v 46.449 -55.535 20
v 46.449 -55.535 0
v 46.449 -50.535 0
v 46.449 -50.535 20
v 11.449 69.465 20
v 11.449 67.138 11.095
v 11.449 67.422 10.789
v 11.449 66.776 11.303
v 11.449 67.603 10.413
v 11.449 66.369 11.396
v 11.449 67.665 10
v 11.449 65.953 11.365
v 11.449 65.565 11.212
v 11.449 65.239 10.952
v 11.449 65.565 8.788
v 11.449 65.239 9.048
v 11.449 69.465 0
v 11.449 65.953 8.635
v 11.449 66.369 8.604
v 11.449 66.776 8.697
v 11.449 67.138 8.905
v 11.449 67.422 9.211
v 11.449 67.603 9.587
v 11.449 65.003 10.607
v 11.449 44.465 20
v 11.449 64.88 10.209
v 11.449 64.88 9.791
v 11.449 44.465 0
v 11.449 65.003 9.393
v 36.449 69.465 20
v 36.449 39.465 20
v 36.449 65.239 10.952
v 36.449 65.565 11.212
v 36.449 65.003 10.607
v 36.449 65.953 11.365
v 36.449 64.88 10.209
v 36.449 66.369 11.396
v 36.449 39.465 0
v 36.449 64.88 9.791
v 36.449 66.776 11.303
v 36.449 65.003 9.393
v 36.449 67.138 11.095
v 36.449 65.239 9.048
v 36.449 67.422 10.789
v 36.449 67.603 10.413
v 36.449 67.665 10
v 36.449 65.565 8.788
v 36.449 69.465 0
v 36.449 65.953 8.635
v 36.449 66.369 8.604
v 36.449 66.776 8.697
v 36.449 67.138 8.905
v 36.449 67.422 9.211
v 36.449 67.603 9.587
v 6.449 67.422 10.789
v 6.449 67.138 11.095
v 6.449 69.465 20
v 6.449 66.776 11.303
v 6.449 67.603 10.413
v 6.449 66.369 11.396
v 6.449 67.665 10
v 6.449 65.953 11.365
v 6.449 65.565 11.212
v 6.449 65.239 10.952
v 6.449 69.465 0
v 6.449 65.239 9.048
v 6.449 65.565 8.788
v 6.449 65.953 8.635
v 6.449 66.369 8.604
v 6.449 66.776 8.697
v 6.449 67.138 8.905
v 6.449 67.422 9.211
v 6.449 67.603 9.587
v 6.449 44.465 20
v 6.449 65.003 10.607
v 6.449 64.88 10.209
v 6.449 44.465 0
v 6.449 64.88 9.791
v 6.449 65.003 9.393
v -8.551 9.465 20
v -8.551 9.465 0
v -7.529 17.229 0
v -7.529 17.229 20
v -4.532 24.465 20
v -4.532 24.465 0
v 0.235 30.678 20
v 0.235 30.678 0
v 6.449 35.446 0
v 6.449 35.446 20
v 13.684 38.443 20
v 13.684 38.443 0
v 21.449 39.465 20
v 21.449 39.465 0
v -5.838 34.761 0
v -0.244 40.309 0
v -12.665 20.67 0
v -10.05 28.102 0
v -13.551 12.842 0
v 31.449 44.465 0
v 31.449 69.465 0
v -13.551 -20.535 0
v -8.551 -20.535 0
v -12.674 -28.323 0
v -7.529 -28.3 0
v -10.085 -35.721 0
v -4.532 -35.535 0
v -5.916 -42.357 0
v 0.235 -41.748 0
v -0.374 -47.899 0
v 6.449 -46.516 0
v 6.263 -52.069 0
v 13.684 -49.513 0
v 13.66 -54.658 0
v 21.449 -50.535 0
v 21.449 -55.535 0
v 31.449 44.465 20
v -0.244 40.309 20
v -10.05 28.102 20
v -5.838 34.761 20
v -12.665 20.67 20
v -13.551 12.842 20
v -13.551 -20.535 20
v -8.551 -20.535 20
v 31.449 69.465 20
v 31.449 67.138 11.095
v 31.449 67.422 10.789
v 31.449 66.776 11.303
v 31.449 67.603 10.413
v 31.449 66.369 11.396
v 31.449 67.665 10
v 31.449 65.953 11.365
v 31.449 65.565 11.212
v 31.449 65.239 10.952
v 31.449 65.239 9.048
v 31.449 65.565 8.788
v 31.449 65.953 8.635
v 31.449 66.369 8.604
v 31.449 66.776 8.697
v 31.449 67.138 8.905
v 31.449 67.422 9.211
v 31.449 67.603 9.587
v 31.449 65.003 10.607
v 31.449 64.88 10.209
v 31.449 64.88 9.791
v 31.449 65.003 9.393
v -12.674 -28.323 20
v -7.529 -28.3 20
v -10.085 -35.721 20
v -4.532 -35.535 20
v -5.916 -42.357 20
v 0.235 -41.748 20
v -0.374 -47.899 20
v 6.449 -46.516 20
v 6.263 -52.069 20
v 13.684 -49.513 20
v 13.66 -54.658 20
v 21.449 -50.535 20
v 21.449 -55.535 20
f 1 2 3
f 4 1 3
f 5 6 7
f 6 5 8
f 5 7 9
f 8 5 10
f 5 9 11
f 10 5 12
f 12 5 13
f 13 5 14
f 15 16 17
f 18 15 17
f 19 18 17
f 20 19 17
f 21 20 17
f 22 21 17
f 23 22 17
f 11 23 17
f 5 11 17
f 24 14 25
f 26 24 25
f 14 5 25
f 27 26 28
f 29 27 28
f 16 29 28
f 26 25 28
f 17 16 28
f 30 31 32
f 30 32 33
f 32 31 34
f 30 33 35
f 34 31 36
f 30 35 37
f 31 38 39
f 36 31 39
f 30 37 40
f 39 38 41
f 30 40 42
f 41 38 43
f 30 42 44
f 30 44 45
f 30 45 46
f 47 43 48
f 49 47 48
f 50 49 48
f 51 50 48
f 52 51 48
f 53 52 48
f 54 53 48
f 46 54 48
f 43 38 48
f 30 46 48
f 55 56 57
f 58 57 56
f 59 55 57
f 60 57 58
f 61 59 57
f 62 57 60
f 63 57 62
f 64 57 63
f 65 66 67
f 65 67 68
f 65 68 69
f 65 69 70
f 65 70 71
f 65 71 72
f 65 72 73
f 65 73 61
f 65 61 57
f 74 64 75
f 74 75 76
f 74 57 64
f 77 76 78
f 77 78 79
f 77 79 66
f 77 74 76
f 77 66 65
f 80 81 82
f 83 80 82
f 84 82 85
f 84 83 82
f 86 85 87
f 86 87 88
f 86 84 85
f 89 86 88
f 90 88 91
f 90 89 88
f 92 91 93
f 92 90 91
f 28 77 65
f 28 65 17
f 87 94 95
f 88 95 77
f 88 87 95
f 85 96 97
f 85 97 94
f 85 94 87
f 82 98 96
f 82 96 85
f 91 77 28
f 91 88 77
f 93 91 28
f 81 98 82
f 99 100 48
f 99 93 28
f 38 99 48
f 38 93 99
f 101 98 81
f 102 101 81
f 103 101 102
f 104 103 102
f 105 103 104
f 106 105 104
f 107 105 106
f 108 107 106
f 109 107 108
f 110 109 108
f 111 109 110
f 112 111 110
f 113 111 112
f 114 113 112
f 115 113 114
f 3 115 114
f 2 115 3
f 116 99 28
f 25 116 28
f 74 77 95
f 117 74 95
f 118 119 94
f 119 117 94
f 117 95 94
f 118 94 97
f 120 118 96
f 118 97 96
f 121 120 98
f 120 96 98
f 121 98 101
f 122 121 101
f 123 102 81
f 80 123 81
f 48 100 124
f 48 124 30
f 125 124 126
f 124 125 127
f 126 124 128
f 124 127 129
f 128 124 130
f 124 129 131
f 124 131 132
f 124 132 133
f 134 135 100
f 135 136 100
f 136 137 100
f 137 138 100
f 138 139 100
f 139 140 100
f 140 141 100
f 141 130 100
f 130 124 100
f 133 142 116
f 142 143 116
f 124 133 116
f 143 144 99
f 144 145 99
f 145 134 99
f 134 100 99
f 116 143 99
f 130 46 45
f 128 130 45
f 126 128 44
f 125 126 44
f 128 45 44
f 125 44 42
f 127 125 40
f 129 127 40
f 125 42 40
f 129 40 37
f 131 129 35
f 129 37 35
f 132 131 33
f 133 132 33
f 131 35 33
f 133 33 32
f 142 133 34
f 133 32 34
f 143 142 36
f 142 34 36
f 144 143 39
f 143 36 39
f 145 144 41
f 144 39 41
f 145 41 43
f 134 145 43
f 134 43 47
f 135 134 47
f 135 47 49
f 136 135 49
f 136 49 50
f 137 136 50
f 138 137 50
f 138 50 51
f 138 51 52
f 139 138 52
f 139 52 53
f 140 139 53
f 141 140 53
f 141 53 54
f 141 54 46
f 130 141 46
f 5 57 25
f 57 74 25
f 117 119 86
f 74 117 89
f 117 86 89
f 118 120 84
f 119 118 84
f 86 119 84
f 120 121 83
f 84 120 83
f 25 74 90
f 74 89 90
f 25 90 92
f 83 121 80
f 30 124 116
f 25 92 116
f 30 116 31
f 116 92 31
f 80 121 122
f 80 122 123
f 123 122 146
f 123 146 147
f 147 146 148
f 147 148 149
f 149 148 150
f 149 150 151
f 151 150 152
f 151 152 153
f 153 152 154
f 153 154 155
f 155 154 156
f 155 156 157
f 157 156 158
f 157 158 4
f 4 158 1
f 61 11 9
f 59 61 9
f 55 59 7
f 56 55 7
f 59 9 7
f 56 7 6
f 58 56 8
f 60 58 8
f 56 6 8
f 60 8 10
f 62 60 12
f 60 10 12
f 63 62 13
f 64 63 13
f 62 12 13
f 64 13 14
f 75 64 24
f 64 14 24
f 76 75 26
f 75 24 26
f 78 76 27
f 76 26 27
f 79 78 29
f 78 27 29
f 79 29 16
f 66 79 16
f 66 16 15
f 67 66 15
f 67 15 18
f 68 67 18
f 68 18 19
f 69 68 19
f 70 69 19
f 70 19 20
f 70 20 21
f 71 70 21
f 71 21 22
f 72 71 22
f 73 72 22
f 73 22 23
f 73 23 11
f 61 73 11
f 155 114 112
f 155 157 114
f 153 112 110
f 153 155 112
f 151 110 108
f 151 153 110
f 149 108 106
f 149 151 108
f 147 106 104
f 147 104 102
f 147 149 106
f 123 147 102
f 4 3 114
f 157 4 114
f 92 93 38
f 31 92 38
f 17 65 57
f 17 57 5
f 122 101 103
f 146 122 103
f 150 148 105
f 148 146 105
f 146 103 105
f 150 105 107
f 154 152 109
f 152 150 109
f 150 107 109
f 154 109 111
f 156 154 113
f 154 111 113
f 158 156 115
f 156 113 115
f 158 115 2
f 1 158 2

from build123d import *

# Parameters (mm, degrees)
BOSS_EXTRUDE1_DEPTH = 20
FILLET1_R           = 30
FILLET2_R           = 35
SKETCH2_W           = 5
SKETCH2_H           = 20
BOSS_EXTRUDE2_DEPTH = 15
SKETCH3_R           = 1.4
CUT_EXTRUDE1_DEPTH  = 45


with BuildPart() as part:
    # Sketch1 → Boss-Extrude1 (new body)
    with BuildSketch(Plane.XY):
        Polygon((11.448507825, 54.464802922), (6.448507825, 54.464802922), (6.448507825, 44.464802922), (-8.551492175, 44.464802922), (-13.551492175, 44.464802922), (-13.551492175, 39.464802922), (-13.551492175, -50.535197078), (-13.551492175, -55.535197078), (-8.551492175, -55.535197078), (46.448507825, -55.535197078), (46.448507825, -50.535197078), (-8.551492175, -50.535197078), (-8.551492175, 39.464802922), (6.448507825, 39.464802922), (36.448507825, 39.464802922), (36.448507825, 54.464802922), (31.448507825, 54.464802922), (31.448507825, 44.464802922), (11.448507825, 44.464802922), align=None)
    extrude(amount=BOSS_EXTRUDE1_DEPTH)

    # Fillet1
    fillet1_edges = [part.edges().sort_by_distance(p)[0] for p in [
        (-8.551492175, 39.464802922, 10),
        (-8.551492175, -50.535197078, 10),
    ]]
    fillet(fillet1_edges, radius=FILLET1_R)

    # Fillet2
    # the kernel refuses this fillet: 35 mm, written as the material it takes off along each edge
    with BuildSketch(Plane(origin=(-13.551492175, -55.535197078, -87.5), x_dir=(1, 0, 0), z_dir=(0, 0, 1))) as fillet2_piece_1:
        with BuildLine():
            CenterArc((FILLET2_R, FILLET2_R), FILLET2_R, 180, 90)
            Line((0, FILLET2_R), (-FILLET2_R * 0.02, FILLET2_R))
            Line((-FILLET2_R * 0.02, FILLET2_R), (-FILLET2_R * 0.02, -FILLET2_R * 0.02))
            Line((-FILLET2_R * 0.02, -FILLET2_R * 0.02), (FILLET2_R, -FILLET2_R * 0.02))
            Line((FILLET2_R, -FILLET2_R * 0.02), (FILLET2_R, 0))
        make_face()
    extrude(amount=195, mode=Mode.SUBTRACT)
    with BuildSketch(Plane(origin=(-13.551492175, 44.464802922, -79.056941504), x_dir=(0, -1, 0), z_dir=(0, 0, 1))) as fillet2_piece_2:
        with BuildLine():
            CenterArc((31.622776602, 35), FILLET2_R, 205.376933525, 64.623066475)
            Line((0, 20), (-0.632455532, 19.7))
            ThreePointArc((-0.632455532, 19.7), (-0.7, 10), (-0.7, 0))
            Line((-0.7, 0), (0, -0.7))
            Line((0, -0.7), (31.622776602, -0.7))
            Line((31.622776602, -0.7), (31.622776602, 0))
        make_face()
    extrude(amount=178.113883008, mode=Mode.SUBTRACT)

    # Sketch2 → Boss-Extrude2 (add)
    with BuildSketch(Plane(origin=(0, 54.464802922, 0), x_dir=(1, 0, 0), z_dir=(0, 1, 0))):
        with Locations((8.948507825, -10)):
            Rectangle(SKETCH2_W, SKETCH2_H)
        with Locations((33.948507825, -10)):
            Rectangle(SKETCH2_W, SKETCH2_H)
    extrude(amount=BOSS_EXTRUDE2_DEPTH)

    # Sketch3 → Cut-Extrude1 (cut)
    with BuildSketch(Plane(origin=(36.448507825, 0, 0), x_dir=(0, 0, -1), z_dir=(1, 0, 0))):
        with Locations(Location((-10, 66.264802922, 0), (0, 0, 90))):
            Circle(SKETCH3_R)
    extrude(amount=-CUT_EXTRUDE1_DEPTH, mode=Mode.SUBTRACT)


solid = part.part
